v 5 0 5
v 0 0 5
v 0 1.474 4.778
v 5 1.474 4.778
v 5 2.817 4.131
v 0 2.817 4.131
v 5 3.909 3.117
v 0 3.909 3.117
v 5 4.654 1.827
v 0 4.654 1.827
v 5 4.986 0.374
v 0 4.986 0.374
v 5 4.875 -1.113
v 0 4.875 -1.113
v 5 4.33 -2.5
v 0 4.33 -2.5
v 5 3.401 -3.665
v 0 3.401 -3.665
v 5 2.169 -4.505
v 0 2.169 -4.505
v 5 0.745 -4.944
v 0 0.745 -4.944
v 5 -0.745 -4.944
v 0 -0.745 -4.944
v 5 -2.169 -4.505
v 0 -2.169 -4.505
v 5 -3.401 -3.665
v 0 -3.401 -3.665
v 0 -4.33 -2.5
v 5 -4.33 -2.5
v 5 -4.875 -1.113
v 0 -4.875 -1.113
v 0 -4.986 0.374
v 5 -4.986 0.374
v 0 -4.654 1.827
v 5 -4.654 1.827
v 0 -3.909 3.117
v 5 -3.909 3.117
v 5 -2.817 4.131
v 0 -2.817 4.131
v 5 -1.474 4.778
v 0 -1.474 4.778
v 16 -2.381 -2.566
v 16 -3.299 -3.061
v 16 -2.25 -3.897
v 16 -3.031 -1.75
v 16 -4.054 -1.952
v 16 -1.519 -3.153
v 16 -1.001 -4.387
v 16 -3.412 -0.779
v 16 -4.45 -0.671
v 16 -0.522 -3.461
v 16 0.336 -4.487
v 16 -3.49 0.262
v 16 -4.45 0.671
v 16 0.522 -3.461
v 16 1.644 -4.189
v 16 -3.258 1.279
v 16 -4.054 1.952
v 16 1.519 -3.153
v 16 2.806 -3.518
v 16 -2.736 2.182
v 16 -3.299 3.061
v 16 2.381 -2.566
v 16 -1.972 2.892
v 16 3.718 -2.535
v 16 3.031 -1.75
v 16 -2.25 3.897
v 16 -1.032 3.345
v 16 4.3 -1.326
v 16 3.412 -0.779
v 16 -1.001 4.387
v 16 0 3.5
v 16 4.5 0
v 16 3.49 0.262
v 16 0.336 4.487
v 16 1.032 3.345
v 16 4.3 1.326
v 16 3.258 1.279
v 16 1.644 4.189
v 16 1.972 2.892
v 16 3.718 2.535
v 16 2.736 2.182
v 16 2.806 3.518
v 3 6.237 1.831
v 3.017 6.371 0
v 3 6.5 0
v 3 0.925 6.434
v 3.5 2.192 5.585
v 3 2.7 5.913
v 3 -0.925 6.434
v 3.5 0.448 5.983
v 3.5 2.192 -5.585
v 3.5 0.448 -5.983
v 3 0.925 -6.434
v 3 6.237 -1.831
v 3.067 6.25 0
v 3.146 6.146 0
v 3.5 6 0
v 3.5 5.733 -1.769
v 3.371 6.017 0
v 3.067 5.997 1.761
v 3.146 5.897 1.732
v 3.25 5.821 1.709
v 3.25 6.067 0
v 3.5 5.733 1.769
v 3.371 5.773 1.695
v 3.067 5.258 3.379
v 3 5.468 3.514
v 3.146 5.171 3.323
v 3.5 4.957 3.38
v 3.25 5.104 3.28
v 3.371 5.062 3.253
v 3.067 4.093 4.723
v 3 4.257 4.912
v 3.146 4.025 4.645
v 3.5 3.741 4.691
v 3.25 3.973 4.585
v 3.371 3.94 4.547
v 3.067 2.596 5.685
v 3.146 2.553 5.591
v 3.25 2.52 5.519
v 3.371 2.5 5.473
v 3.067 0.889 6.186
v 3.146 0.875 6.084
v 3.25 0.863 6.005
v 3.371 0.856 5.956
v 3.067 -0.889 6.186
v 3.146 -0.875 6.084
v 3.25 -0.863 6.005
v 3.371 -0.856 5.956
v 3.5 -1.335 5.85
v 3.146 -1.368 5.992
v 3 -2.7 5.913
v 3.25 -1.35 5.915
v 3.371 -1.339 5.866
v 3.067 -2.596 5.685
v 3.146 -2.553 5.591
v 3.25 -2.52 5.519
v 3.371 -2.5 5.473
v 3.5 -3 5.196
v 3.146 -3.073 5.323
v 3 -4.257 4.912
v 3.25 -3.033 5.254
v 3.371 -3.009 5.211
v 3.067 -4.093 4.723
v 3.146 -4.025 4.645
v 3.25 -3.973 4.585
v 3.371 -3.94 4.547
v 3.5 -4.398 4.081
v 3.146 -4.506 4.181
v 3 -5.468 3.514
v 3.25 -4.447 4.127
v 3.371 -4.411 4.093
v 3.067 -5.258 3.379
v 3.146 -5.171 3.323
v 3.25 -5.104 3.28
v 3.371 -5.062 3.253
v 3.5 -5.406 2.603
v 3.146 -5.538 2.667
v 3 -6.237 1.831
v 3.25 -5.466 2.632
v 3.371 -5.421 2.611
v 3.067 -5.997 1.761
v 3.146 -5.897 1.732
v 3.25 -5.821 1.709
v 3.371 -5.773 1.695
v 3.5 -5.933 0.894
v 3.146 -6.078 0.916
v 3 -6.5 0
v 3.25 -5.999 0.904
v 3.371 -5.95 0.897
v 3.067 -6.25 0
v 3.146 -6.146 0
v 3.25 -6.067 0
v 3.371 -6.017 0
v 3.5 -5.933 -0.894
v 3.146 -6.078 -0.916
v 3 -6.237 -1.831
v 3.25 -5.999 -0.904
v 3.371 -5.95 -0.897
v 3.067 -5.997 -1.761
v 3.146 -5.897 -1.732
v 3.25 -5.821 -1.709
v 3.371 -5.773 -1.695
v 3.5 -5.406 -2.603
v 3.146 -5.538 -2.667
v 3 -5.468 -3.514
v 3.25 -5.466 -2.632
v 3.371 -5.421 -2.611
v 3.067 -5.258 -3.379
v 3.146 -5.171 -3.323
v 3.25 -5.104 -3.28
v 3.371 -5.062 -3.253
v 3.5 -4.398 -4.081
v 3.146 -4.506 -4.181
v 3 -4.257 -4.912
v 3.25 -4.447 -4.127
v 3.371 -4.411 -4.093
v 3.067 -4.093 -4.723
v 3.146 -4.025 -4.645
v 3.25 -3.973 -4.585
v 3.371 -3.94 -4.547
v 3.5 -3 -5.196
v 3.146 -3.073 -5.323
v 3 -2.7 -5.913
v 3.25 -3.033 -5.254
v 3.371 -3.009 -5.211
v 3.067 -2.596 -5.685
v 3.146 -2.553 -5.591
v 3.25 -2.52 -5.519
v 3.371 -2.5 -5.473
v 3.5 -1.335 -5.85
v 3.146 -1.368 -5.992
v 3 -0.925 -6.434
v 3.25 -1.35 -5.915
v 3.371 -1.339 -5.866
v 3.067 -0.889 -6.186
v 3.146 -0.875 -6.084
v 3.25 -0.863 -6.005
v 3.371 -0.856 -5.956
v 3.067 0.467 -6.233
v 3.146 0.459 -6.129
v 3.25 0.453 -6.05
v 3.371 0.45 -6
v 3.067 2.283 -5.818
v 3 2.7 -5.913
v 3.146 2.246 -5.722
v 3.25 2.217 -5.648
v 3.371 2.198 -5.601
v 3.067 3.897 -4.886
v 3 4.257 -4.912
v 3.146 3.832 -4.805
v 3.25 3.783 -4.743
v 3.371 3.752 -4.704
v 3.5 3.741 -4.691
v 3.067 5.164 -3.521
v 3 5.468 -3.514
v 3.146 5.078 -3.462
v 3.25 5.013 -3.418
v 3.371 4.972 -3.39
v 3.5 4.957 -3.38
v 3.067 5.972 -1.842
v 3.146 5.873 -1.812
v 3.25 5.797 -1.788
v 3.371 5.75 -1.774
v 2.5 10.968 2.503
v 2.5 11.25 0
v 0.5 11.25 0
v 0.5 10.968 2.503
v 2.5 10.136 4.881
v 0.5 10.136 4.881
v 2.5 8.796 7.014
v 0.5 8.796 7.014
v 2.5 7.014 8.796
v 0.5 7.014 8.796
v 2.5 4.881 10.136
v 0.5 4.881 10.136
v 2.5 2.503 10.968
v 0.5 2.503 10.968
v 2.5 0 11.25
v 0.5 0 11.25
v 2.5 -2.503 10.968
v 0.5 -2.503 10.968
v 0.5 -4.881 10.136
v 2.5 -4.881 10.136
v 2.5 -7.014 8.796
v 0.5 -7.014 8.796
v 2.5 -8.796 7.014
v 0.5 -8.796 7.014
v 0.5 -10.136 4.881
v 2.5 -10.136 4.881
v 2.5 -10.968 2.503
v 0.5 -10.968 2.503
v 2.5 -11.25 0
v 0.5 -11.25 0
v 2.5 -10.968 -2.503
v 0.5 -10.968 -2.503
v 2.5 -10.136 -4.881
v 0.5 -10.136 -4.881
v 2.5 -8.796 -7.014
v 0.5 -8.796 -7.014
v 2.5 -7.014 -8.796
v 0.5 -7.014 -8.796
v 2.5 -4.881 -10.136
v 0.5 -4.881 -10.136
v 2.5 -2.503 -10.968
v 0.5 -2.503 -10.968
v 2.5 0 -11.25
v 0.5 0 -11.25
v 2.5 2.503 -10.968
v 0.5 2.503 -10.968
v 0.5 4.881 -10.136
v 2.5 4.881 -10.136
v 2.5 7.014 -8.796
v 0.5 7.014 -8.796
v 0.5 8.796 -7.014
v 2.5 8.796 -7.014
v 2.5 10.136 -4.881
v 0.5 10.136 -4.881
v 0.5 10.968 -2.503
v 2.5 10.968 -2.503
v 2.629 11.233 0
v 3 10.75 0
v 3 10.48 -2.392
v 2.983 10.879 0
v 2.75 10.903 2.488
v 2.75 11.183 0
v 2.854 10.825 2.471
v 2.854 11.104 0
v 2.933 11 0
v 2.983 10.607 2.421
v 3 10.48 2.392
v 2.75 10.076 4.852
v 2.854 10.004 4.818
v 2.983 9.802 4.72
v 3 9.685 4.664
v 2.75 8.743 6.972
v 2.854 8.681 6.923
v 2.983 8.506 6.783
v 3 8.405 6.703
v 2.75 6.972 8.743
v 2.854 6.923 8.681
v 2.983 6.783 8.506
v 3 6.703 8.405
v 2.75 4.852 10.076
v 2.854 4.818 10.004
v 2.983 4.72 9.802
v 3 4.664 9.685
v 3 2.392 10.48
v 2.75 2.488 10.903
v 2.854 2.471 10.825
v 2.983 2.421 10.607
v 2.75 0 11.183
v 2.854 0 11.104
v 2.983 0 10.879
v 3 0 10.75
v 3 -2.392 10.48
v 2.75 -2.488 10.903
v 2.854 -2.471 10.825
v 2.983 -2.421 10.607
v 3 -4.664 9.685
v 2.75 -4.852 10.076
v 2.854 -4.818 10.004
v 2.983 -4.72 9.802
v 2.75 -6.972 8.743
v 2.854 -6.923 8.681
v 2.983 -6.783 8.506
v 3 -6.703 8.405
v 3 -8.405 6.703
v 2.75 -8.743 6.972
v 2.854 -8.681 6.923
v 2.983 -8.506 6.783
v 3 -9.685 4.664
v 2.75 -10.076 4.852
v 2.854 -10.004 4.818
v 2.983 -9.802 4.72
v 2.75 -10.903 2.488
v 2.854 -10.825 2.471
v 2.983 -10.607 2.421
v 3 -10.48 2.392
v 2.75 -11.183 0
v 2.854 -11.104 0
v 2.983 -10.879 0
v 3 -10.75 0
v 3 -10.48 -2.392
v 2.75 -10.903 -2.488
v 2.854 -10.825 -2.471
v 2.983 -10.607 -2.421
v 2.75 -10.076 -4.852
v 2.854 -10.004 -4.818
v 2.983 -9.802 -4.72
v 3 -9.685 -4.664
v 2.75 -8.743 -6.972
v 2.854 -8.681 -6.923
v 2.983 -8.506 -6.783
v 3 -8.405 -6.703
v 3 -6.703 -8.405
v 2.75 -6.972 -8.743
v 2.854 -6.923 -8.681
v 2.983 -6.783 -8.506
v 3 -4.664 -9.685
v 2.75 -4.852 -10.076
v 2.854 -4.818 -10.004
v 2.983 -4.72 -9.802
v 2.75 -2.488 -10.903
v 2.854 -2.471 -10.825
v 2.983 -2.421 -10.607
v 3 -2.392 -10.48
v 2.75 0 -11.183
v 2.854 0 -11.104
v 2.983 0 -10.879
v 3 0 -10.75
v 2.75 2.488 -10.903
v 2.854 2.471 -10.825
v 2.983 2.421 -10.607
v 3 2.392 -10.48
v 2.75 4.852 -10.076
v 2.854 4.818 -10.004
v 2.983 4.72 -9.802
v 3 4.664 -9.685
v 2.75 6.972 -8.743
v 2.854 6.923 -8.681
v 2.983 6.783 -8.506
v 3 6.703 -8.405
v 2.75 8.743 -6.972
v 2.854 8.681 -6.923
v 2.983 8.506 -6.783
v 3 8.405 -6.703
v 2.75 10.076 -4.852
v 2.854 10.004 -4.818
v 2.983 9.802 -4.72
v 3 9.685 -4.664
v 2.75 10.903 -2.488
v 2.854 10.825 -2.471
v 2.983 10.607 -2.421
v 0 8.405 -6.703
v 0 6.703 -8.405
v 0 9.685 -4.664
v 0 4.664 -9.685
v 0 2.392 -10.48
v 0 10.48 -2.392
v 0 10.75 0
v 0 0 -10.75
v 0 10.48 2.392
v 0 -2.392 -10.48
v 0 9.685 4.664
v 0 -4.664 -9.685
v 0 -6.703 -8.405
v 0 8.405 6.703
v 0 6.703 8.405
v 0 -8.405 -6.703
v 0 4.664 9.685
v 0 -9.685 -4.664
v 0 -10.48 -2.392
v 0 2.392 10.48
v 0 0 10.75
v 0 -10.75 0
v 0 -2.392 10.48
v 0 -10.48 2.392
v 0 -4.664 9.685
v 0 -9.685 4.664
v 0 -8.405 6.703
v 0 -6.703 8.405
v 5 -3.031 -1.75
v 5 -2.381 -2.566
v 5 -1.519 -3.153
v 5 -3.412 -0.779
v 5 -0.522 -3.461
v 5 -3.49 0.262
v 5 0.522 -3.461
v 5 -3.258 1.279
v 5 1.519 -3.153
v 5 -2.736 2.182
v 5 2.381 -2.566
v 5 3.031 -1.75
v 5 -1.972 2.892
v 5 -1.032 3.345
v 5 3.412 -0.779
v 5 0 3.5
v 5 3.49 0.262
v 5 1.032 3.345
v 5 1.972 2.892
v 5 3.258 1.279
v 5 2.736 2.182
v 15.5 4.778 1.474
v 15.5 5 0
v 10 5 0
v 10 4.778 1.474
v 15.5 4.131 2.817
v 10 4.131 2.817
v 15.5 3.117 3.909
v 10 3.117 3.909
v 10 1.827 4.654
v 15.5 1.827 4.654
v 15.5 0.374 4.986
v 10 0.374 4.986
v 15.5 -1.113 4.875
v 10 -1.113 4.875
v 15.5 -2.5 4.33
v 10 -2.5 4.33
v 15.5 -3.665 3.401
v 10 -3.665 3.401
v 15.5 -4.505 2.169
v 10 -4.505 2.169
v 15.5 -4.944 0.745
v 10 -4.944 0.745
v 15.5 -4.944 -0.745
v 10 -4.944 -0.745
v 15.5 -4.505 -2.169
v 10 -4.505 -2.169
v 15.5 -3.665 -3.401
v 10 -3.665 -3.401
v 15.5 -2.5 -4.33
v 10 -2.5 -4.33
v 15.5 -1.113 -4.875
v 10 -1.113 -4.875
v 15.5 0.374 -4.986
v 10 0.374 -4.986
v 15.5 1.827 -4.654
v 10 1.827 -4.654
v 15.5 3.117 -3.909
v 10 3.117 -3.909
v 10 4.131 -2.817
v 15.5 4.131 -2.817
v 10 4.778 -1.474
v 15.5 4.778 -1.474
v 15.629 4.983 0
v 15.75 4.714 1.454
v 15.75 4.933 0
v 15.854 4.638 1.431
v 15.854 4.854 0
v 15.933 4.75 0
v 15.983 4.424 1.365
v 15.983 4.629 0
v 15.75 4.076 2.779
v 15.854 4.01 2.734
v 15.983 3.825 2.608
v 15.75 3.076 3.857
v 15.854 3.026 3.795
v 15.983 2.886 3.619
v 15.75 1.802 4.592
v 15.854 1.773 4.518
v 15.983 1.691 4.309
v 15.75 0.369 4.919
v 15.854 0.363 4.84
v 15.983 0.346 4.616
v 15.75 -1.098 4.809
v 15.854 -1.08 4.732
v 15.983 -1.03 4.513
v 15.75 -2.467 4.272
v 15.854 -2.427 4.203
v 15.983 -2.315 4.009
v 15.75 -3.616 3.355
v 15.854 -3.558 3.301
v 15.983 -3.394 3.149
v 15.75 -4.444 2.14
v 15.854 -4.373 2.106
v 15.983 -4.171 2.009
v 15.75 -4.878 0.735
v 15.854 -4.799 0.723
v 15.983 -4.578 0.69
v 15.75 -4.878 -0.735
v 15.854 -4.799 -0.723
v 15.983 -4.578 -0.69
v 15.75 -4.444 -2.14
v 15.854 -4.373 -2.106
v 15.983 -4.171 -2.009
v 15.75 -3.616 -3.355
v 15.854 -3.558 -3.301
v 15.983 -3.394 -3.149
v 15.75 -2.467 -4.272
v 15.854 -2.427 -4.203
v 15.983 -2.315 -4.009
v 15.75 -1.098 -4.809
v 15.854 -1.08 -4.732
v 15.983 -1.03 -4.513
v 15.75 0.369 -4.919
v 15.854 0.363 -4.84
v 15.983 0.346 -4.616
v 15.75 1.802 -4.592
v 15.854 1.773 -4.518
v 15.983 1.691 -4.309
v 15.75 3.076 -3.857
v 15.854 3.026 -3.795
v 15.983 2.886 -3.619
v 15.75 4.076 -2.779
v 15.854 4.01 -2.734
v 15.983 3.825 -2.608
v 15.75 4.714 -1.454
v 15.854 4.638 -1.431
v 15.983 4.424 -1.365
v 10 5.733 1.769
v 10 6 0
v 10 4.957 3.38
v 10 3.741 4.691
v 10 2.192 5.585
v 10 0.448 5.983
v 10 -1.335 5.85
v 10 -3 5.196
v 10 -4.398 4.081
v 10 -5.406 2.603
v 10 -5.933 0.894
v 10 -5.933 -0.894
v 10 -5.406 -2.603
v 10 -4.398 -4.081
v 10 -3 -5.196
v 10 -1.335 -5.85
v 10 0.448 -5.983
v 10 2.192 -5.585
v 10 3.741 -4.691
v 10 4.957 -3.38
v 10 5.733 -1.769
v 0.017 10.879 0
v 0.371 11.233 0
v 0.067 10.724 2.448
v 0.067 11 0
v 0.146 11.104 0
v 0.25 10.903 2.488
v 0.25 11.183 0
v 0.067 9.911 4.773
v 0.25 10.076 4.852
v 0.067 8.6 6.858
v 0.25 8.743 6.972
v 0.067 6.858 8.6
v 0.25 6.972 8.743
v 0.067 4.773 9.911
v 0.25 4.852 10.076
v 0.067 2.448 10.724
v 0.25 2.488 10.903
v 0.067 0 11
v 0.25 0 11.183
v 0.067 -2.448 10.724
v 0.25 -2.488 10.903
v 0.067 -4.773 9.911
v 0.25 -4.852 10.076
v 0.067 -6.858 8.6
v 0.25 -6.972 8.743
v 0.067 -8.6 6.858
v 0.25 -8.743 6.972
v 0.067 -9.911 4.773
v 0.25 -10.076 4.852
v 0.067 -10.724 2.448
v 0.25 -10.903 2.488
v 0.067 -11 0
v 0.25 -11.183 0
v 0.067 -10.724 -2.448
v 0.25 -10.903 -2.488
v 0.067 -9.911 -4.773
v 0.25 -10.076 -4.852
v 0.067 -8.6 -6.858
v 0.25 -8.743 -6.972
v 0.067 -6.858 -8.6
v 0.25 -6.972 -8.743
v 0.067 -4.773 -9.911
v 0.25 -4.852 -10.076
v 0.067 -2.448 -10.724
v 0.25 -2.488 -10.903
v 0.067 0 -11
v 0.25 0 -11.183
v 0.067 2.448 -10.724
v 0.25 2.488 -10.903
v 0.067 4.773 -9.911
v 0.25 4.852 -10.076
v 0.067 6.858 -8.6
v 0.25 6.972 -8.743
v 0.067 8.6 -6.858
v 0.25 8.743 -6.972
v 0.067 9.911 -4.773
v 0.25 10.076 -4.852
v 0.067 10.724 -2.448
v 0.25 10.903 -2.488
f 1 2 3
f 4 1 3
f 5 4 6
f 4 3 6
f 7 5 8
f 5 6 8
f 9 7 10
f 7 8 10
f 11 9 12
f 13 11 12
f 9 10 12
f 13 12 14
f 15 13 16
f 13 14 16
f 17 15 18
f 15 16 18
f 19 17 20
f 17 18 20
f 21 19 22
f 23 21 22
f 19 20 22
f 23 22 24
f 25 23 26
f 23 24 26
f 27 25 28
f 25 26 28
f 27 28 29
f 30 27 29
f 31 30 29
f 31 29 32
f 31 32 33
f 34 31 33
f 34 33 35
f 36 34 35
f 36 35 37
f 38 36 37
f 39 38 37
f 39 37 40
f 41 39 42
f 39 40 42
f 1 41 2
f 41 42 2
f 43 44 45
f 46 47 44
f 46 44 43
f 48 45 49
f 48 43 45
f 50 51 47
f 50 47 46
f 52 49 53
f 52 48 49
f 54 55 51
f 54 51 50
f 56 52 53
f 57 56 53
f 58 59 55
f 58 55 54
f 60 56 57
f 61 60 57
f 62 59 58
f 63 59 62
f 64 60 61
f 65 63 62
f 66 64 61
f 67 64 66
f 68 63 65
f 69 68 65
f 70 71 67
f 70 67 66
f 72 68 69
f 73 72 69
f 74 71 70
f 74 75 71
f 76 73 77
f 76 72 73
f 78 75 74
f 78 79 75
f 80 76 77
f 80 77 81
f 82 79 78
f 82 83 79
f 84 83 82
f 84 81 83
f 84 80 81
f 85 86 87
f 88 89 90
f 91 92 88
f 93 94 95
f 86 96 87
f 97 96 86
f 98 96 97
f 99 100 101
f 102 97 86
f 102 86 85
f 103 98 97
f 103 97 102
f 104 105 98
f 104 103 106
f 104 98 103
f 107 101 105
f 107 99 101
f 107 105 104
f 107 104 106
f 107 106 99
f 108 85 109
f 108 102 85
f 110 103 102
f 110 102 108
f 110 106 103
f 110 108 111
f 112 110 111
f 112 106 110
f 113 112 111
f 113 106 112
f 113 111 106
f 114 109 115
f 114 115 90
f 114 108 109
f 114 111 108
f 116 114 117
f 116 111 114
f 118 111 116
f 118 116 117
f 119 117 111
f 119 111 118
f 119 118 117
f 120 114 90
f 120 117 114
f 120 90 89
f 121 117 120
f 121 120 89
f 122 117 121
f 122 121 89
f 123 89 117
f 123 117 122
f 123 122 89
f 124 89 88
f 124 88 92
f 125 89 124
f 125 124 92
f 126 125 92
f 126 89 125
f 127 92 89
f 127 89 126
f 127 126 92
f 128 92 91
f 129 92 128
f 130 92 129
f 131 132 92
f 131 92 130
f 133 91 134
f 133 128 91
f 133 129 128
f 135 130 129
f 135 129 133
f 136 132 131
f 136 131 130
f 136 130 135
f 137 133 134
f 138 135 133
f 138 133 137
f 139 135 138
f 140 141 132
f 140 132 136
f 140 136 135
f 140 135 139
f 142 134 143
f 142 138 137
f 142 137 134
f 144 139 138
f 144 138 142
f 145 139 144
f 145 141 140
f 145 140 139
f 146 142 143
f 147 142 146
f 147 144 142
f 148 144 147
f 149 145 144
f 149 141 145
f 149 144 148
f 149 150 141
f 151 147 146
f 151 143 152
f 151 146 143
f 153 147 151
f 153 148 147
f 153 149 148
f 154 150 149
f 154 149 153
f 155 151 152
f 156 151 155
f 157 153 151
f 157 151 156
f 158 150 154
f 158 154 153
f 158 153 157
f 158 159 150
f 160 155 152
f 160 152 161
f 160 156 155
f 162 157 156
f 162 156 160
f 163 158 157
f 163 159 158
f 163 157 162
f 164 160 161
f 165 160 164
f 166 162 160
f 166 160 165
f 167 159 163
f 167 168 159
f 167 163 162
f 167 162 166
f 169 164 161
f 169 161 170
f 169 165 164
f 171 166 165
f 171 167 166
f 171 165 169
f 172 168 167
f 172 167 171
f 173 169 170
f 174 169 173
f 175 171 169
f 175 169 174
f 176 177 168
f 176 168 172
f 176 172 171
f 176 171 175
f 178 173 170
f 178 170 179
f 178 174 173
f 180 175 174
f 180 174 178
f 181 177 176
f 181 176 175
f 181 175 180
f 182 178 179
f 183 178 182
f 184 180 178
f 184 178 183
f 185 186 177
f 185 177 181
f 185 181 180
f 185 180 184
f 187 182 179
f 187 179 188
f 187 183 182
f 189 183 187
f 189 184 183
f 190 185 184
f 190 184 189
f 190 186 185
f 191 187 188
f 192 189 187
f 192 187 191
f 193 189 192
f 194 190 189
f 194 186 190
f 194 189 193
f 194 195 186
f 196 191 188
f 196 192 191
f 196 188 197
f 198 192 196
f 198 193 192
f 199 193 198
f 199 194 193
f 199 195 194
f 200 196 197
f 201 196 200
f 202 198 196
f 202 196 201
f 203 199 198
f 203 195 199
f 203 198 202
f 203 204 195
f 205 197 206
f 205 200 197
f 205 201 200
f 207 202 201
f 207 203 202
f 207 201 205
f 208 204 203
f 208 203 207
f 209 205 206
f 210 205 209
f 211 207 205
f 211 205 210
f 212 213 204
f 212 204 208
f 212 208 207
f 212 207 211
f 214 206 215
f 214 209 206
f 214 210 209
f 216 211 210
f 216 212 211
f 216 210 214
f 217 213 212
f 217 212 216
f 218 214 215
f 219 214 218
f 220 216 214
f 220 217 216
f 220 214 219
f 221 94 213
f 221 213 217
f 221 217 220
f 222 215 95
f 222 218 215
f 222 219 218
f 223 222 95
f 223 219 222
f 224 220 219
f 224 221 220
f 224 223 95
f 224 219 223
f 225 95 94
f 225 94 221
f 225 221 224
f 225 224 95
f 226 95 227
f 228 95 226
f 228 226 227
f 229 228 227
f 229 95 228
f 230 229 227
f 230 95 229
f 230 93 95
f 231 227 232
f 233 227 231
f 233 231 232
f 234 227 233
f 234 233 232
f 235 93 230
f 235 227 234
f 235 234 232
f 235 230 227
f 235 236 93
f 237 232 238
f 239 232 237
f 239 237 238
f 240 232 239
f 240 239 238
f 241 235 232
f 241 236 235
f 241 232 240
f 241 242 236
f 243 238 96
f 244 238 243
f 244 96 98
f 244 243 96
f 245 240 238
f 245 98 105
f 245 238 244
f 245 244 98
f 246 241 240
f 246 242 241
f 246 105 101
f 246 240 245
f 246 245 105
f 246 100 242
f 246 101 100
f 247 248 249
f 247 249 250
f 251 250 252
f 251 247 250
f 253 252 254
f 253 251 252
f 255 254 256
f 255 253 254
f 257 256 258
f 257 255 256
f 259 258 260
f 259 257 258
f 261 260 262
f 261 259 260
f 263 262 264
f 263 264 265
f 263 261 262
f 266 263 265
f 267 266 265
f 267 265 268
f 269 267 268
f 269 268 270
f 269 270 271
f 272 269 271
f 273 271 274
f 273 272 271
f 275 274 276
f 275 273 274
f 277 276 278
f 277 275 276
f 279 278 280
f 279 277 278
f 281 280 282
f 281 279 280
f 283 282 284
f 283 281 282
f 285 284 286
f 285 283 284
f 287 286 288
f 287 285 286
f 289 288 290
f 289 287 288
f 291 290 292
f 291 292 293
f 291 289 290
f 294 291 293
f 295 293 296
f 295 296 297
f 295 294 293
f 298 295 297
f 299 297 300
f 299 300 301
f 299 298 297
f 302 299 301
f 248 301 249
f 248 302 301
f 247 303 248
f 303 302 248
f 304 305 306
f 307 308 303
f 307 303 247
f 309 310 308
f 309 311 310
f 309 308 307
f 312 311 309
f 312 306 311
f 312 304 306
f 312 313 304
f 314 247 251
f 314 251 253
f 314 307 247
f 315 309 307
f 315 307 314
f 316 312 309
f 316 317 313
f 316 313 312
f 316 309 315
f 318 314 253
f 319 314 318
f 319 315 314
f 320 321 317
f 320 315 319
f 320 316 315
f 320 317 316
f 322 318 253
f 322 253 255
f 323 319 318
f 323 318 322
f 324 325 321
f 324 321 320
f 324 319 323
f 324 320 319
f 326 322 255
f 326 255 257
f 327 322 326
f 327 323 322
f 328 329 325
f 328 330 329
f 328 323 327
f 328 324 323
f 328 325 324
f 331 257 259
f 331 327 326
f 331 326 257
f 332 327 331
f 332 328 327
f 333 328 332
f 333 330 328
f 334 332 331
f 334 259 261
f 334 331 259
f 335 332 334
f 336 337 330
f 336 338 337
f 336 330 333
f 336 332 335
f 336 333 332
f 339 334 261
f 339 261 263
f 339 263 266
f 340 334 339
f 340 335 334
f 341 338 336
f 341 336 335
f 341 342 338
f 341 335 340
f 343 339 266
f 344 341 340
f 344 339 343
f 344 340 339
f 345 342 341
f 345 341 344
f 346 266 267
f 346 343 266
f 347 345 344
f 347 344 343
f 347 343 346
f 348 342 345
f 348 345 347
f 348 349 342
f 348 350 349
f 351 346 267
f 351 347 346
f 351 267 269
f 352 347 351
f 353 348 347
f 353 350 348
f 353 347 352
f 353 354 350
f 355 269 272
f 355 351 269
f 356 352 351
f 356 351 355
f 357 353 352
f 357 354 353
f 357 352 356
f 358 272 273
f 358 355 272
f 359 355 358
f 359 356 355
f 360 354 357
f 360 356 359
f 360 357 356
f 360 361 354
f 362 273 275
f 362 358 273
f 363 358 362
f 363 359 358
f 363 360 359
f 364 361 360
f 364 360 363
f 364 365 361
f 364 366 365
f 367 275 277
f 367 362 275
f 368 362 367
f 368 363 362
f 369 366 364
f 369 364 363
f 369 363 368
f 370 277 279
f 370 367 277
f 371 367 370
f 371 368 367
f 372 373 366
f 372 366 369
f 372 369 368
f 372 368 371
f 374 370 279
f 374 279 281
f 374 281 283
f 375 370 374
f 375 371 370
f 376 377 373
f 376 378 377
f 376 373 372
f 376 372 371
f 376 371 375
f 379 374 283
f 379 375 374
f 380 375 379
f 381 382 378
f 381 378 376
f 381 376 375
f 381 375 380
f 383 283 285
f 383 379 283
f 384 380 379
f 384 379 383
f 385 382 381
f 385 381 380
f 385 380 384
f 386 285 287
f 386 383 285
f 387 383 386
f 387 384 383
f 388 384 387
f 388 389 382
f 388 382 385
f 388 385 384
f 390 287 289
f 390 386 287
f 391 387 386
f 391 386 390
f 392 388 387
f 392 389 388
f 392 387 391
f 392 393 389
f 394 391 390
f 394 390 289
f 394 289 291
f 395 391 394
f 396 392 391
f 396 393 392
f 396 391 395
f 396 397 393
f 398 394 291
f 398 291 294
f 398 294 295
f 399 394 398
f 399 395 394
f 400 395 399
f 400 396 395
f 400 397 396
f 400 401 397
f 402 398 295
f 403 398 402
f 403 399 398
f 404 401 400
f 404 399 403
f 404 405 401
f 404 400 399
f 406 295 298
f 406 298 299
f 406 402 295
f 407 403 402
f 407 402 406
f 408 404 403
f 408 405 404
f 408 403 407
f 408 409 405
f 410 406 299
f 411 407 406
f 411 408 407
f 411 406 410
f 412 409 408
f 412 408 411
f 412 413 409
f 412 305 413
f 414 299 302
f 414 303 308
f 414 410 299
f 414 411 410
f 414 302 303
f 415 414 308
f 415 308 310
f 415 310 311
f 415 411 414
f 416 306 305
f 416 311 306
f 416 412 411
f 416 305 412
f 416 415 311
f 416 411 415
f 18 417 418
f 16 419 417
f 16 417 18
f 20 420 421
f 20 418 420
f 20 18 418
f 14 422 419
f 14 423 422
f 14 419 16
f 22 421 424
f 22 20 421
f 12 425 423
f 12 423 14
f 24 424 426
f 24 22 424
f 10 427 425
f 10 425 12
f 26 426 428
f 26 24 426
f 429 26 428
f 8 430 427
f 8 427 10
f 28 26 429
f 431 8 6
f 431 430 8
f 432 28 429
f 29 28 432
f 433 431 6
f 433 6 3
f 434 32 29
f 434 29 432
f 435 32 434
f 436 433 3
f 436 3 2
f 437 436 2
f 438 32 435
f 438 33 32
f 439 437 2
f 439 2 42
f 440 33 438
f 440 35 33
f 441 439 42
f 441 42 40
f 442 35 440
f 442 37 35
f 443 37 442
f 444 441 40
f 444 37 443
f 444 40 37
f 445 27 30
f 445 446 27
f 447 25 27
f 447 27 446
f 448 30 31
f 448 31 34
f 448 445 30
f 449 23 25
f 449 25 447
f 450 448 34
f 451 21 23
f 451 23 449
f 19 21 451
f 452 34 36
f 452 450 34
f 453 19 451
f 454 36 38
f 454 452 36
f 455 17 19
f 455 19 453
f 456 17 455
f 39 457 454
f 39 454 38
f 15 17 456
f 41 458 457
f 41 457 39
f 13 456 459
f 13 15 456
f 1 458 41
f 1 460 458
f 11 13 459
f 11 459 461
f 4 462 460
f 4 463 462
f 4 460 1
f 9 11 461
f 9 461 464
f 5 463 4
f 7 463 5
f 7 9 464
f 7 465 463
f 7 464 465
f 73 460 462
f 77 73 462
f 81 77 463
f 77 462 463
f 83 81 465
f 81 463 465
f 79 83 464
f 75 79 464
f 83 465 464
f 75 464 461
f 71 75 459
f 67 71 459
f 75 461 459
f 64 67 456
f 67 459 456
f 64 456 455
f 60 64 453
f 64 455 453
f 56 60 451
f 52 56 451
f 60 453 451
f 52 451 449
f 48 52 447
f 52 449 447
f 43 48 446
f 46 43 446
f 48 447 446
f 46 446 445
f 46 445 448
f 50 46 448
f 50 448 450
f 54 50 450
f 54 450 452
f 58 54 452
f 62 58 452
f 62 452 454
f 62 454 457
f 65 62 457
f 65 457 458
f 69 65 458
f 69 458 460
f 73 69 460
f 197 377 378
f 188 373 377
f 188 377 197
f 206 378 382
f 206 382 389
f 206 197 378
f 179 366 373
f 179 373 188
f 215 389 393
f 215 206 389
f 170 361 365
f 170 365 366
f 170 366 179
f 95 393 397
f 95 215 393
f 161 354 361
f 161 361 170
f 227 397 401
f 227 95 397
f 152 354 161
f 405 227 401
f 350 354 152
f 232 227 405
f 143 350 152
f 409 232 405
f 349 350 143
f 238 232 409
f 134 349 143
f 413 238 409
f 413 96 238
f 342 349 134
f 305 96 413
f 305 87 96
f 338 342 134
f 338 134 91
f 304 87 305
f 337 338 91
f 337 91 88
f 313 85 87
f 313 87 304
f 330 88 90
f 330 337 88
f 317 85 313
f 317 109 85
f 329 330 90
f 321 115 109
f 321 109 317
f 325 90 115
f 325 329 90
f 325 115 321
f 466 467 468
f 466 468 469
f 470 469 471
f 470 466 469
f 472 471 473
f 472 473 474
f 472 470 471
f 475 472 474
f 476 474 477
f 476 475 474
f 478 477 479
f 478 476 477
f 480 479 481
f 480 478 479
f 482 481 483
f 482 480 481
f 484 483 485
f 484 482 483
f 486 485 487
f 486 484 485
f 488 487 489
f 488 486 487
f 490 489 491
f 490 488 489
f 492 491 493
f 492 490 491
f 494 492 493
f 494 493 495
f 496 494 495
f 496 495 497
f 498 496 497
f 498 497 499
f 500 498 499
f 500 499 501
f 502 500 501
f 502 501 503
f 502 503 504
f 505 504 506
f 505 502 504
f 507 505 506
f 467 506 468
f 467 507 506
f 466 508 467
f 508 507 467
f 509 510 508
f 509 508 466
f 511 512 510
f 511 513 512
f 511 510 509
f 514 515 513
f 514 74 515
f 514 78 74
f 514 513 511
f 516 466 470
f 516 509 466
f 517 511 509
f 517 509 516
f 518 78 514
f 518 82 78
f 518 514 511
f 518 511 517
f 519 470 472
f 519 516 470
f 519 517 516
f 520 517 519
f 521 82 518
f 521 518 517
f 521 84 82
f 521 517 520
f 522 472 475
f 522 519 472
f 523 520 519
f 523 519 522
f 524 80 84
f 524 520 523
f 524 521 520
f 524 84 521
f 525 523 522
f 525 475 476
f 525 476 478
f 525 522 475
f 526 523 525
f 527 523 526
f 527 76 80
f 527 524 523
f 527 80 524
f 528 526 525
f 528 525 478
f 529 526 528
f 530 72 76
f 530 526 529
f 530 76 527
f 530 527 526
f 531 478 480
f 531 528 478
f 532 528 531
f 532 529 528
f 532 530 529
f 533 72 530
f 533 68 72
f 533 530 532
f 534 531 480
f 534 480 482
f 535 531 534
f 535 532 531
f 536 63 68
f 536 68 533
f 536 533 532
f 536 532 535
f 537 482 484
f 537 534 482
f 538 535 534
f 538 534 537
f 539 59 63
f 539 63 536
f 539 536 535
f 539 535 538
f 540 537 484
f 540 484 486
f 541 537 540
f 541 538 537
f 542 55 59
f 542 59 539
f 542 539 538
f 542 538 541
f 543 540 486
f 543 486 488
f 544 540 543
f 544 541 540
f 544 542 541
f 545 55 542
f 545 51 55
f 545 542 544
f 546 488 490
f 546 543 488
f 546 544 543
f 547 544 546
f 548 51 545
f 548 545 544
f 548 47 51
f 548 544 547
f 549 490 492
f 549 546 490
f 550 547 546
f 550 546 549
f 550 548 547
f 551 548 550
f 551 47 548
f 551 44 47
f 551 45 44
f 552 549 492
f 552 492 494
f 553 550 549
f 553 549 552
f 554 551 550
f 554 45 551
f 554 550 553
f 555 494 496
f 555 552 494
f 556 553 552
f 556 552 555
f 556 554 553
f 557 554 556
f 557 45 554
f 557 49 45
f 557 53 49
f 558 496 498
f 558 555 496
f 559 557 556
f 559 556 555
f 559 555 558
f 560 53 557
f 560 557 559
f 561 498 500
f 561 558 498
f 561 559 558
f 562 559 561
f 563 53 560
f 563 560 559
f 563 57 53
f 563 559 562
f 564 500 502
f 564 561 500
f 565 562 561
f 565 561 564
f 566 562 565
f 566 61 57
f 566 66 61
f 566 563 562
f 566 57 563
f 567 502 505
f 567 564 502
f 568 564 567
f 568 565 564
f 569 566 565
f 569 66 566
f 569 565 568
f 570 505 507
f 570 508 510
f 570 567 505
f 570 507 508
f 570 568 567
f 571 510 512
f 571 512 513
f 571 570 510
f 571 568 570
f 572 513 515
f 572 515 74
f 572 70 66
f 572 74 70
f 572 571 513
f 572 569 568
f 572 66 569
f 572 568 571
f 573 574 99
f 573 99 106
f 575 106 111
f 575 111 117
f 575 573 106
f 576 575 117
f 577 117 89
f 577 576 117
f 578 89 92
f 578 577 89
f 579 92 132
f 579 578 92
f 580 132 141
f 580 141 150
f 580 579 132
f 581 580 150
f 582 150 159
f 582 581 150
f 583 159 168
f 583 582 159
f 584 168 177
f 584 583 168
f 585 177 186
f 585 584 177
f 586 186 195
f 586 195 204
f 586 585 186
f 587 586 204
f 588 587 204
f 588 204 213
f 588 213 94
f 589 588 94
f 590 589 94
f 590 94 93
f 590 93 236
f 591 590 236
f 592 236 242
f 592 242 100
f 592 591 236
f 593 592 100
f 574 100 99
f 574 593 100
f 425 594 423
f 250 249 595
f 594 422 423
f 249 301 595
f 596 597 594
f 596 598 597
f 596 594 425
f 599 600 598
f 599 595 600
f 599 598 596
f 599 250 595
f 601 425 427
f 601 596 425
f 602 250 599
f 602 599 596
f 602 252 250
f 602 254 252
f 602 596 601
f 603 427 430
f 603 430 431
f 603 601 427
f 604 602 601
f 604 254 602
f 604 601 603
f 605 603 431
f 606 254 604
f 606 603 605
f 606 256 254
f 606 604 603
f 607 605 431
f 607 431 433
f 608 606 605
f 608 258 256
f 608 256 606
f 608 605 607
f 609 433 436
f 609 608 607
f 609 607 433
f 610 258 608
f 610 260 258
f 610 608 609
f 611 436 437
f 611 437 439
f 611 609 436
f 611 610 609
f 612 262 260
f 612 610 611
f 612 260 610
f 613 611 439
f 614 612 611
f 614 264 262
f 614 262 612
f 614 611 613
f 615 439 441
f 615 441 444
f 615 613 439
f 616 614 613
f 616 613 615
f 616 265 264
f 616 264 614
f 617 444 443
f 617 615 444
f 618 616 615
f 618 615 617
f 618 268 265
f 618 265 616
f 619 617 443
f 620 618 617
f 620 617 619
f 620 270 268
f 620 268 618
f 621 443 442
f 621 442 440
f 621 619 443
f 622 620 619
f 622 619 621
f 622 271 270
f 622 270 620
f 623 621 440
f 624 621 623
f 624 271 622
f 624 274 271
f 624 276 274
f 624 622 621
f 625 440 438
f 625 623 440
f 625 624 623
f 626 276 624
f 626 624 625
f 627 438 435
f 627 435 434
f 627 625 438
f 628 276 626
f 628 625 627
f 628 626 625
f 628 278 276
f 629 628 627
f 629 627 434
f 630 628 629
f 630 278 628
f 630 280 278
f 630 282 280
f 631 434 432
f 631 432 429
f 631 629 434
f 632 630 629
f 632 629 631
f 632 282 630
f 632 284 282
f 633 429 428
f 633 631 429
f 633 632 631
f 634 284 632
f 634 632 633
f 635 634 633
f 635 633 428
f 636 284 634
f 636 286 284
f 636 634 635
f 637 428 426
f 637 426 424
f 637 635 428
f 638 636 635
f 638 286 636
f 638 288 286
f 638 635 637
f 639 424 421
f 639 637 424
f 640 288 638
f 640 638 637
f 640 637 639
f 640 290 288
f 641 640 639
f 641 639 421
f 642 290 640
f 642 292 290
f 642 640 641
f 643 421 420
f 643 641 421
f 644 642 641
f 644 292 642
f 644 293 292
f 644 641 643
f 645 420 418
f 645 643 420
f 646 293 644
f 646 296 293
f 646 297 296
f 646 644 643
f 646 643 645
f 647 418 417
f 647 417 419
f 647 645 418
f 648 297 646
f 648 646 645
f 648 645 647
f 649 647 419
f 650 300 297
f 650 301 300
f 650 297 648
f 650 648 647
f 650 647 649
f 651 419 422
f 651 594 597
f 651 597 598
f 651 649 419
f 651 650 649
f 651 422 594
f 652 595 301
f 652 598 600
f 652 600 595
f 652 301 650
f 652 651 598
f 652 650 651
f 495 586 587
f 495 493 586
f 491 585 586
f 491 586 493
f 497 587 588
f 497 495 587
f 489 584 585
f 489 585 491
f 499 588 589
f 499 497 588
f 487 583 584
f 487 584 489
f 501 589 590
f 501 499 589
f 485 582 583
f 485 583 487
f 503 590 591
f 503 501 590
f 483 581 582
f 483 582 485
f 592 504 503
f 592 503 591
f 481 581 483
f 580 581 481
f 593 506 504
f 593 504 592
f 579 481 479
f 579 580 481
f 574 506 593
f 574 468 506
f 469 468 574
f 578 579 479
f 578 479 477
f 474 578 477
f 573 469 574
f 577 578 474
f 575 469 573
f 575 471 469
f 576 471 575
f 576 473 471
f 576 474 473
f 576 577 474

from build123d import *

# Parameters (mm, degrees)
FILLET1_R             = 0.5
M8X1_0_TAPPED_HOLE1_D = 7
SKETCH4_R             = 5
CUT_EXTRUDE1_DEPTH    = 5


with BuildPart() as part:
    # Sketch1 → Revolve1 (revolve)
    with BuildSketch(Plane.XY):
        Polygon((0, 0), (0, 11.25), (3, 11.25), (3, 6), (10, 6), (10, 5), (16, 5), (16, 0), align=None)
    revolve(axis=Axis((0, 0, 0), (1, 0, 0)))

    # Fillet1
    fillet1_edges = [part.edges().sort_by_distance(p)[0] for p in [
        (16, -5, 0),
        (3, -6, 0),
        (3, -11.25, 0),
        (0, -11.25, 0),
    ]]
    fillet(fillet1_edges, radius=FILLET1_R)

    # M8x1.0 Tapped Hole1 (through all)
    with Locations(Plane(origin=(16, 0, 0), x_dir=(0, 0, -1), z_dir=(1, 0, 0))):
        with Locations((0, 0)):
            Hole(M8X1_0_TAPPED_HOLE1_D / 2)

    # Sketch4 → Cut-Extrude1 (cut)
    with BuildSketch(Plane.ZY):
        Circle(SKETCH4_R)
    extrude(amount=-CUT_EXTRUDE1_DEPTH, mode=Mode.SUBTRACT)


solid = part.part
